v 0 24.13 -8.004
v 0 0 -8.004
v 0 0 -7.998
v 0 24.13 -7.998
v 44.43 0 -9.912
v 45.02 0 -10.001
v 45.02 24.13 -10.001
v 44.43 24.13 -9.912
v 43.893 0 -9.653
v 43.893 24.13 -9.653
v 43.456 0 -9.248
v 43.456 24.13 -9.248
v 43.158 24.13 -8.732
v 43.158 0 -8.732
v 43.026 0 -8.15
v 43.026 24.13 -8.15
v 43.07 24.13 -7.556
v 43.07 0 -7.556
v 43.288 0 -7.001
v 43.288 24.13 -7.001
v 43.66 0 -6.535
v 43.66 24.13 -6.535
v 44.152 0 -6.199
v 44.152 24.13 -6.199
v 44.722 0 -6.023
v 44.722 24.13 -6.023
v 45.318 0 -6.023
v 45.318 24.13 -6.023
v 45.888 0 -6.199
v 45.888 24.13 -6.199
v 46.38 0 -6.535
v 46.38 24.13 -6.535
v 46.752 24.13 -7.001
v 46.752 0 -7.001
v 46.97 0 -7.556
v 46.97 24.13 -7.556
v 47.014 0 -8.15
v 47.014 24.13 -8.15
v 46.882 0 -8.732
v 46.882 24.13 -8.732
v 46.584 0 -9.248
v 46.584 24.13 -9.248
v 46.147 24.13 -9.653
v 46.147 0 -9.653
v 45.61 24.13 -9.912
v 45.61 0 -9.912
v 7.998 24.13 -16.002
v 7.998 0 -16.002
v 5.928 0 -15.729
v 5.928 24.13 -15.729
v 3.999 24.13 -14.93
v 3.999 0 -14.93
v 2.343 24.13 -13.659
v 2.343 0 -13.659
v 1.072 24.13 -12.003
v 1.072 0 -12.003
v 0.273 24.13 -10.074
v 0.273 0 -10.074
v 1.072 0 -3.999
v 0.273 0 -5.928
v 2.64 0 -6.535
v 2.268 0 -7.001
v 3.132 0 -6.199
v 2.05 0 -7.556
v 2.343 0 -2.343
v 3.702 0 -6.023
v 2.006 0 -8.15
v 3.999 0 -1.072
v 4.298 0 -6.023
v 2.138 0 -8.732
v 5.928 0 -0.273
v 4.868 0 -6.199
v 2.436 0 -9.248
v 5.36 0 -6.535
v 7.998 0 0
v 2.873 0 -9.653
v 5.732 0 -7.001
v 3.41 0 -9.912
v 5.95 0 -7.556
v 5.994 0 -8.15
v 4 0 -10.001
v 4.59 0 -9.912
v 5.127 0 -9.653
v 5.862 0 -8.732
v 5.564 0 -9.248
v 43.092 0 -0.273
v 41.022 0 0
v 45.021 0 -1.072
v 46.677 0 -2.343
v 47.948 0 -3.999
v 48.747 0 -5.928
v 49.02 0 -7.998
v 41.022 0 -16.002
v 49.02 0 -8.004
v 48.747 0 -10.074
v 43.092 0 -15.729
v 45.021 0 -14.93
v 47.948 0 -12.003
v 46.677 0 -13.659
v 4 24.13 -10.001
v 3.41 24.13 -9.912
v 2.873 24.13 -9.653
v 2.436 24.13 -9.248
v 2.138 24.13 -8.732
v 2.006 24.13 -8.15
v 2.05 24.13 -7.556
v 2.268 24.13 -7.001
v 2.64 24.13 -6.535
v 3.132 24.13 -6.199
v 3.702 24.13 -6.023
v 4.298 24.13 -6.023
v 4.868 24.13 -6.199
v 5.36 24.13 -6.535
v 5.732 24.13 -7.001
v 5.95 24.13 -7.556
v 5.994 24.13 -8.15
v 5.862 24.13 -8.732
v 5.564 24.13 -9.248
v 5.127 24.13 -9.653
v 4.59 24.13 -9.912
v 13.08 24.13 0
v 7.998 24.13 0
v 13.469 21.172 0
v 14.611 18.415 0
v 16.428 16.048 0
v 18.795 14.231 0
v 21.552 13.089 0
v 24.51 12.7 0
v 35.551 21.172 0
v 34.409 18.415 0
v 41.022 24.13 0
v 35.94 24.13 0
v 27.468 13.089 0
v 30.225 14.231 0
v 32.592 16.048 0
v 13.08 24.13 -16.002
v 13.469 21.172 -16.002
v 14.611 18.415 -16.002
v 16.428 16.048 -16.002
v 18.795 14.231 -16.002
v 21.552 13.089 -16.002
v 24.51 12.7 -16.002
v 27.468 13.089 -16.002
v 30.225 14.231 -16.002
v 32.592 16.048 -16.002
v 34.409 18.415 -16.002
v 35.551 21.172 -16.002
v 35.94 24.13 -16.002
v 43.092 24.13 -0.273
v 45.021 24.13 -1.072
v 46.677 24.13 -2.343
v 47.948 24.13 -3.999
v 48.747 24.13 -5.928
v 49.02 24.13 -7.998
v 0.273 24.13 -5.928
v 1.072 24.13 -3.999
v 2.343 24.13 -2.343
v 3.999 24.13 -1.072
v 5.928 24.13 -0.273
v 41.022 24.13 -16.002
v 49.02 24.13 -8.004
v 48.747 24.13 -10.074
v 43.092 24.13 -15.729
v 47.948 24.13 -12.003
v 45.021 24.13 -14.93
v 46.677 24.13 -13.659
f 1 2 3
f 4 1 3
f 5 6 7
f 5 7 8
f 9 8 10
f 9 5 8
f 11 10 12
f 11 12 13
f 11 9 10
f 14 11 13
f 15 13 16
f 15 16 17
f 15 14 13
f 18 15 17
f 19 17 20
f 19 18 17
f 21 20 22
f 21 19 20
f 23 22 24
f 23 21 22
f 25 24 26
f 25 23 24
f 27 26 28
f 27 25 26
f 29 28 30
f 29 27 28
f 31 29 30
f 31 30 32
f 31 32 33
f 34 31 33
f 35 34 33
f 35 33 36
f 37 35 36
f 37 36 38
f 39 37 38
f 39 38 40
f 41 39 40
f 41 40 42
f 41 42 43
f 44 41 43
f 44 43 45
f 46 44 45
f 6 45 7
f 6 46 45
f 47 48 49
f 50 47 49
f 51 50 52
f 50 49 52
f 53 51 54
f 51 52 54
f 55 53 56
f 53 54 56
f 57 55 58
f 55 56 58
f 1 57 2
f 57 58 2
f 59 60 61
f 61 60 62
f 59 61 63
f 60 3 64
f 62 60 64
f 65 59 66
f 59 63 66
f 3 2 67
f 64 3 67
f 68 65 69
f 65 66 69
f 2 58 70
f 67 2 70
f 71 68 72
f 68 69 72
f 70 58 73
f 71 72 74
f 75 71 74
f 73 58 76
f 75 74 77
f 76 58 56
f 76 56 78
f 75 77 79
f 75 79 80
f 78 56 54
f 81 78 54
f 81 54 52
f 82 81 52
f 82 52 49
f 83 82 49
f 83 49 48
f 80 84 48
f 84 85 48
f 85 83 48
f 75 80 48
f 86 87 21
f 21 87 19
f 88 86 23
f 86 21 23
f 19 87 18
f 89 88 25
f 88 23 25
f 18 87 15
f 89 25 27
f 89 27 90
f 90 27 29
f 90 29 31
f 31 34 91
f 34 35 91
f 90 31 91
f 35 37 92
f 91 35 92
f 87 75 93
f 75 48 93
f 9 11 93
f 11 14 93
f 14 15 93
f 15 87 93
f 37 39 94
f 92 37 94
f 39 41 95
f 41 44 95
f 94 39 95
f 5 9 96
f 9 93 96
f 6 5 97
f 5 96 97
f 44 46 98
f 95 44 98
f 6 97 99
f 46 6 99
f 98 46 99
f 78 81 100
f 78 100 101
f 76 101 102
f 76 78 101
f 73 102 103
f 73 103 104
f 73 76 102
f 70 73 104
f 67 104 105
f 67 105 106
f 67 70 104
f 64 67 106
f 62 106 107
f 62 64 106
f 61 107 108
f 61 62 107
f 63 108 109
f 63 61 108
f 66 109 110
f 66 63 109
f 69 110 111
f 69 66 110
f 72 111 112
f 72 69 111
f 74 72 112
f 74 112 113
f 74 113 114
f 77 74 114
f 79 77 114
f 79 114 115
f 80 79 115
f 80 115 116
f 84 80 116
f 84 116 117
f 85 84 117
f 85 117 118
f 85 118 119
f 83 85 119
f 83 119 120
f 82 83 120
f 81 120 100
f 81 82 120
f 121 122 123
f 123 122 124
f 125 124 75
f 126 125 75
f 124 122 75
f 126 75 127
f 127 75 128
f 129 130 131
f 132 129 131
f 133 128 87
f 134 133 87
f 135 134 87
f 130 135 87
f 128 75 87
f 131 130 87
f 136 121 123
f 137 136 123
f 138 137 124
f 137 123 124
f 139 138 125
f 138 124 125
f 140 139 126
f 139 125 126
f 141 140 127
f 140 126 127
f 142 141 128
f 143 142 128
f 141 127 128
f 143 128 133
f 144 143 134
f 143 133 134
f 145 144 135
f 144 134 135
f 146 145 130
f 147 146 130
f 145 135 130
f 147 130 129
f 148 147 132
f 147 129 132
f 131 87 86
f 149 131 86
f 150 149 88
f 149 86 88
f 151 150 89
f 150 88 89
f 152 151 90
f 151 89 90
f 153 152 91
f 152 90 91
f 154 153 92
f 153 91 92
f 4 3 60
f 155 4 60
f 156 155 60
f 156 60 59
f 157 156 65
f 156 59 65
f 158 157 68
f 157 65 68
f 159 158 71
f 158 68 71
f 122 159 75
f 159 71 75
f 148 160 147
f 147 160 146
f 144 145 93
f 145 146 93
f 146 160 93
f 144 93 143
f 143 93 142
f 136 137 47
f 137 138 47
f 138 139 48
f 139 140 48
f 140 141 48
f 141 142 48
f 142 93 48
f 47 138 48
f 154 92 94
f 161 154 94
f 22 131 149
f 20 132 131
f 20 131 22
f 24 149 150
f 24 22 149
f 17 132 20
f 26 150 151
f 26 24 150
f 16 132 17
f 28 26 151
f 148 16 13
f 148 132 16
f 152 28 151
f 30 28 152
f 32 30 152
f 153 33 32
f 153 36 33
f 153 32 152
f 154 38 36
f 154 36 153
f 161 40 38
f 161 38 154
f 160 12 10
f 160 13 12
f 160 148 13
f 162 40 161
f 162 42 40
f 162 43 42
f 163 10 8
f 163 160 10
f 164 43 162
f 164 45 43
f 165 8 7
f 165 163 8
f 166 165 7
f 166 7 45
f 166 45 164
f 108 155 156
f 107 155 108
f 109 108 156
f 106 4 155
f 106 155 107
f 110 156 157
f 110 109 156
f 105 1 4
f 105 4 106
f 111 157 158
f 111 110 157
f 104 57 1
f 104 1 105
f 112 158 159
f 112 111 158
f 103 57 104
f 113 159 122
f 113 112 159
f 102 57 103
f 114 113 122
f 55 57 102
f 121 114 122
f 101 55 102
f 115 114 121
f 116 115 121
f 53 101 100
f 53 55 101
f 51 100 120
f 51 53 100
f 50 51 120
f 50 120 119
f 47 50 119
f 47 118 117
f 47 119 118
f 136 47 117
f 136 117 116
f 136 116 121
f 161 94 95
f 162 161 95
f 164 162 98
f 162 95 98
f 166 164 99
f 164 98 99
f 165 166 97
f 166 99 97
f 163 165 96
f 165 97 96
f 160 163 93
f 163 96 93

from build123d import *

# Parameters (mm, degrees)
SKETCH1_R           = 2
BOSS_EXTRUDE1_DEPTH = 24.13
SKETCH2_R           = 11.43
CUT_EXTRUDE1_DEPTH  = 57.932251879


with BuildPart() as part:
    # Sketch1 → Boss-Extrude1 (new body)
    with BuildSketch(Plane(origin=(0, 0, 0), x_dir=(1, 0, 0), z_dir=(0, 1, 0))):
        with BuildLine():
            Line((7.99846, 0), (41.02154, 0))
            ThreePointArc((41.02154, 0), (46.677305305, 2.342694695), (49.02, 7.99846))
            Line((49.02, 7.99846), (49.02, 8.00354))
            ThreePointArc((49.02, 8.00354), (46.677305305, 13.659305305), (41.02154, 16.002))
            Line((41.02154, 16.002), (7.99846, 16.002))
            ThreePointArc((7.99846, 16.002), (2.342694695, 13.659305305), (0, 8.00354))
            Line((0, 8.00354), (0, 7.99846))
            ThreePointArc((0, 7.99846), (2.342694695, 2.342694695), (7.99846, 0))
        make_face()
        with Locations(Location((4, 8.001, 0), (0, 0, 90))):
            Circle(SKETCH1_R, mode=Mode.SUBTRACT)
        with Locations(Location((45.02, 8.001, 0), (0, 0, 90))):
            Circle(SKETCH1_R, mode=Mode.SUBTRACT)
    extrude(amount=BOSS_EXTRUDE1_DEPTH)

    # Sketch2 → Cut-Extrude1 (cut, through all)
    with BuildSketch(Plane.XY):
        with Locations((24.51, 24.13)):
            Circle(SKETCH2_R)
    extrude(amount=-CUT_EXTRUDE1_DEPTH, mode=Mode.SUBTRACT)


solid = part.part
